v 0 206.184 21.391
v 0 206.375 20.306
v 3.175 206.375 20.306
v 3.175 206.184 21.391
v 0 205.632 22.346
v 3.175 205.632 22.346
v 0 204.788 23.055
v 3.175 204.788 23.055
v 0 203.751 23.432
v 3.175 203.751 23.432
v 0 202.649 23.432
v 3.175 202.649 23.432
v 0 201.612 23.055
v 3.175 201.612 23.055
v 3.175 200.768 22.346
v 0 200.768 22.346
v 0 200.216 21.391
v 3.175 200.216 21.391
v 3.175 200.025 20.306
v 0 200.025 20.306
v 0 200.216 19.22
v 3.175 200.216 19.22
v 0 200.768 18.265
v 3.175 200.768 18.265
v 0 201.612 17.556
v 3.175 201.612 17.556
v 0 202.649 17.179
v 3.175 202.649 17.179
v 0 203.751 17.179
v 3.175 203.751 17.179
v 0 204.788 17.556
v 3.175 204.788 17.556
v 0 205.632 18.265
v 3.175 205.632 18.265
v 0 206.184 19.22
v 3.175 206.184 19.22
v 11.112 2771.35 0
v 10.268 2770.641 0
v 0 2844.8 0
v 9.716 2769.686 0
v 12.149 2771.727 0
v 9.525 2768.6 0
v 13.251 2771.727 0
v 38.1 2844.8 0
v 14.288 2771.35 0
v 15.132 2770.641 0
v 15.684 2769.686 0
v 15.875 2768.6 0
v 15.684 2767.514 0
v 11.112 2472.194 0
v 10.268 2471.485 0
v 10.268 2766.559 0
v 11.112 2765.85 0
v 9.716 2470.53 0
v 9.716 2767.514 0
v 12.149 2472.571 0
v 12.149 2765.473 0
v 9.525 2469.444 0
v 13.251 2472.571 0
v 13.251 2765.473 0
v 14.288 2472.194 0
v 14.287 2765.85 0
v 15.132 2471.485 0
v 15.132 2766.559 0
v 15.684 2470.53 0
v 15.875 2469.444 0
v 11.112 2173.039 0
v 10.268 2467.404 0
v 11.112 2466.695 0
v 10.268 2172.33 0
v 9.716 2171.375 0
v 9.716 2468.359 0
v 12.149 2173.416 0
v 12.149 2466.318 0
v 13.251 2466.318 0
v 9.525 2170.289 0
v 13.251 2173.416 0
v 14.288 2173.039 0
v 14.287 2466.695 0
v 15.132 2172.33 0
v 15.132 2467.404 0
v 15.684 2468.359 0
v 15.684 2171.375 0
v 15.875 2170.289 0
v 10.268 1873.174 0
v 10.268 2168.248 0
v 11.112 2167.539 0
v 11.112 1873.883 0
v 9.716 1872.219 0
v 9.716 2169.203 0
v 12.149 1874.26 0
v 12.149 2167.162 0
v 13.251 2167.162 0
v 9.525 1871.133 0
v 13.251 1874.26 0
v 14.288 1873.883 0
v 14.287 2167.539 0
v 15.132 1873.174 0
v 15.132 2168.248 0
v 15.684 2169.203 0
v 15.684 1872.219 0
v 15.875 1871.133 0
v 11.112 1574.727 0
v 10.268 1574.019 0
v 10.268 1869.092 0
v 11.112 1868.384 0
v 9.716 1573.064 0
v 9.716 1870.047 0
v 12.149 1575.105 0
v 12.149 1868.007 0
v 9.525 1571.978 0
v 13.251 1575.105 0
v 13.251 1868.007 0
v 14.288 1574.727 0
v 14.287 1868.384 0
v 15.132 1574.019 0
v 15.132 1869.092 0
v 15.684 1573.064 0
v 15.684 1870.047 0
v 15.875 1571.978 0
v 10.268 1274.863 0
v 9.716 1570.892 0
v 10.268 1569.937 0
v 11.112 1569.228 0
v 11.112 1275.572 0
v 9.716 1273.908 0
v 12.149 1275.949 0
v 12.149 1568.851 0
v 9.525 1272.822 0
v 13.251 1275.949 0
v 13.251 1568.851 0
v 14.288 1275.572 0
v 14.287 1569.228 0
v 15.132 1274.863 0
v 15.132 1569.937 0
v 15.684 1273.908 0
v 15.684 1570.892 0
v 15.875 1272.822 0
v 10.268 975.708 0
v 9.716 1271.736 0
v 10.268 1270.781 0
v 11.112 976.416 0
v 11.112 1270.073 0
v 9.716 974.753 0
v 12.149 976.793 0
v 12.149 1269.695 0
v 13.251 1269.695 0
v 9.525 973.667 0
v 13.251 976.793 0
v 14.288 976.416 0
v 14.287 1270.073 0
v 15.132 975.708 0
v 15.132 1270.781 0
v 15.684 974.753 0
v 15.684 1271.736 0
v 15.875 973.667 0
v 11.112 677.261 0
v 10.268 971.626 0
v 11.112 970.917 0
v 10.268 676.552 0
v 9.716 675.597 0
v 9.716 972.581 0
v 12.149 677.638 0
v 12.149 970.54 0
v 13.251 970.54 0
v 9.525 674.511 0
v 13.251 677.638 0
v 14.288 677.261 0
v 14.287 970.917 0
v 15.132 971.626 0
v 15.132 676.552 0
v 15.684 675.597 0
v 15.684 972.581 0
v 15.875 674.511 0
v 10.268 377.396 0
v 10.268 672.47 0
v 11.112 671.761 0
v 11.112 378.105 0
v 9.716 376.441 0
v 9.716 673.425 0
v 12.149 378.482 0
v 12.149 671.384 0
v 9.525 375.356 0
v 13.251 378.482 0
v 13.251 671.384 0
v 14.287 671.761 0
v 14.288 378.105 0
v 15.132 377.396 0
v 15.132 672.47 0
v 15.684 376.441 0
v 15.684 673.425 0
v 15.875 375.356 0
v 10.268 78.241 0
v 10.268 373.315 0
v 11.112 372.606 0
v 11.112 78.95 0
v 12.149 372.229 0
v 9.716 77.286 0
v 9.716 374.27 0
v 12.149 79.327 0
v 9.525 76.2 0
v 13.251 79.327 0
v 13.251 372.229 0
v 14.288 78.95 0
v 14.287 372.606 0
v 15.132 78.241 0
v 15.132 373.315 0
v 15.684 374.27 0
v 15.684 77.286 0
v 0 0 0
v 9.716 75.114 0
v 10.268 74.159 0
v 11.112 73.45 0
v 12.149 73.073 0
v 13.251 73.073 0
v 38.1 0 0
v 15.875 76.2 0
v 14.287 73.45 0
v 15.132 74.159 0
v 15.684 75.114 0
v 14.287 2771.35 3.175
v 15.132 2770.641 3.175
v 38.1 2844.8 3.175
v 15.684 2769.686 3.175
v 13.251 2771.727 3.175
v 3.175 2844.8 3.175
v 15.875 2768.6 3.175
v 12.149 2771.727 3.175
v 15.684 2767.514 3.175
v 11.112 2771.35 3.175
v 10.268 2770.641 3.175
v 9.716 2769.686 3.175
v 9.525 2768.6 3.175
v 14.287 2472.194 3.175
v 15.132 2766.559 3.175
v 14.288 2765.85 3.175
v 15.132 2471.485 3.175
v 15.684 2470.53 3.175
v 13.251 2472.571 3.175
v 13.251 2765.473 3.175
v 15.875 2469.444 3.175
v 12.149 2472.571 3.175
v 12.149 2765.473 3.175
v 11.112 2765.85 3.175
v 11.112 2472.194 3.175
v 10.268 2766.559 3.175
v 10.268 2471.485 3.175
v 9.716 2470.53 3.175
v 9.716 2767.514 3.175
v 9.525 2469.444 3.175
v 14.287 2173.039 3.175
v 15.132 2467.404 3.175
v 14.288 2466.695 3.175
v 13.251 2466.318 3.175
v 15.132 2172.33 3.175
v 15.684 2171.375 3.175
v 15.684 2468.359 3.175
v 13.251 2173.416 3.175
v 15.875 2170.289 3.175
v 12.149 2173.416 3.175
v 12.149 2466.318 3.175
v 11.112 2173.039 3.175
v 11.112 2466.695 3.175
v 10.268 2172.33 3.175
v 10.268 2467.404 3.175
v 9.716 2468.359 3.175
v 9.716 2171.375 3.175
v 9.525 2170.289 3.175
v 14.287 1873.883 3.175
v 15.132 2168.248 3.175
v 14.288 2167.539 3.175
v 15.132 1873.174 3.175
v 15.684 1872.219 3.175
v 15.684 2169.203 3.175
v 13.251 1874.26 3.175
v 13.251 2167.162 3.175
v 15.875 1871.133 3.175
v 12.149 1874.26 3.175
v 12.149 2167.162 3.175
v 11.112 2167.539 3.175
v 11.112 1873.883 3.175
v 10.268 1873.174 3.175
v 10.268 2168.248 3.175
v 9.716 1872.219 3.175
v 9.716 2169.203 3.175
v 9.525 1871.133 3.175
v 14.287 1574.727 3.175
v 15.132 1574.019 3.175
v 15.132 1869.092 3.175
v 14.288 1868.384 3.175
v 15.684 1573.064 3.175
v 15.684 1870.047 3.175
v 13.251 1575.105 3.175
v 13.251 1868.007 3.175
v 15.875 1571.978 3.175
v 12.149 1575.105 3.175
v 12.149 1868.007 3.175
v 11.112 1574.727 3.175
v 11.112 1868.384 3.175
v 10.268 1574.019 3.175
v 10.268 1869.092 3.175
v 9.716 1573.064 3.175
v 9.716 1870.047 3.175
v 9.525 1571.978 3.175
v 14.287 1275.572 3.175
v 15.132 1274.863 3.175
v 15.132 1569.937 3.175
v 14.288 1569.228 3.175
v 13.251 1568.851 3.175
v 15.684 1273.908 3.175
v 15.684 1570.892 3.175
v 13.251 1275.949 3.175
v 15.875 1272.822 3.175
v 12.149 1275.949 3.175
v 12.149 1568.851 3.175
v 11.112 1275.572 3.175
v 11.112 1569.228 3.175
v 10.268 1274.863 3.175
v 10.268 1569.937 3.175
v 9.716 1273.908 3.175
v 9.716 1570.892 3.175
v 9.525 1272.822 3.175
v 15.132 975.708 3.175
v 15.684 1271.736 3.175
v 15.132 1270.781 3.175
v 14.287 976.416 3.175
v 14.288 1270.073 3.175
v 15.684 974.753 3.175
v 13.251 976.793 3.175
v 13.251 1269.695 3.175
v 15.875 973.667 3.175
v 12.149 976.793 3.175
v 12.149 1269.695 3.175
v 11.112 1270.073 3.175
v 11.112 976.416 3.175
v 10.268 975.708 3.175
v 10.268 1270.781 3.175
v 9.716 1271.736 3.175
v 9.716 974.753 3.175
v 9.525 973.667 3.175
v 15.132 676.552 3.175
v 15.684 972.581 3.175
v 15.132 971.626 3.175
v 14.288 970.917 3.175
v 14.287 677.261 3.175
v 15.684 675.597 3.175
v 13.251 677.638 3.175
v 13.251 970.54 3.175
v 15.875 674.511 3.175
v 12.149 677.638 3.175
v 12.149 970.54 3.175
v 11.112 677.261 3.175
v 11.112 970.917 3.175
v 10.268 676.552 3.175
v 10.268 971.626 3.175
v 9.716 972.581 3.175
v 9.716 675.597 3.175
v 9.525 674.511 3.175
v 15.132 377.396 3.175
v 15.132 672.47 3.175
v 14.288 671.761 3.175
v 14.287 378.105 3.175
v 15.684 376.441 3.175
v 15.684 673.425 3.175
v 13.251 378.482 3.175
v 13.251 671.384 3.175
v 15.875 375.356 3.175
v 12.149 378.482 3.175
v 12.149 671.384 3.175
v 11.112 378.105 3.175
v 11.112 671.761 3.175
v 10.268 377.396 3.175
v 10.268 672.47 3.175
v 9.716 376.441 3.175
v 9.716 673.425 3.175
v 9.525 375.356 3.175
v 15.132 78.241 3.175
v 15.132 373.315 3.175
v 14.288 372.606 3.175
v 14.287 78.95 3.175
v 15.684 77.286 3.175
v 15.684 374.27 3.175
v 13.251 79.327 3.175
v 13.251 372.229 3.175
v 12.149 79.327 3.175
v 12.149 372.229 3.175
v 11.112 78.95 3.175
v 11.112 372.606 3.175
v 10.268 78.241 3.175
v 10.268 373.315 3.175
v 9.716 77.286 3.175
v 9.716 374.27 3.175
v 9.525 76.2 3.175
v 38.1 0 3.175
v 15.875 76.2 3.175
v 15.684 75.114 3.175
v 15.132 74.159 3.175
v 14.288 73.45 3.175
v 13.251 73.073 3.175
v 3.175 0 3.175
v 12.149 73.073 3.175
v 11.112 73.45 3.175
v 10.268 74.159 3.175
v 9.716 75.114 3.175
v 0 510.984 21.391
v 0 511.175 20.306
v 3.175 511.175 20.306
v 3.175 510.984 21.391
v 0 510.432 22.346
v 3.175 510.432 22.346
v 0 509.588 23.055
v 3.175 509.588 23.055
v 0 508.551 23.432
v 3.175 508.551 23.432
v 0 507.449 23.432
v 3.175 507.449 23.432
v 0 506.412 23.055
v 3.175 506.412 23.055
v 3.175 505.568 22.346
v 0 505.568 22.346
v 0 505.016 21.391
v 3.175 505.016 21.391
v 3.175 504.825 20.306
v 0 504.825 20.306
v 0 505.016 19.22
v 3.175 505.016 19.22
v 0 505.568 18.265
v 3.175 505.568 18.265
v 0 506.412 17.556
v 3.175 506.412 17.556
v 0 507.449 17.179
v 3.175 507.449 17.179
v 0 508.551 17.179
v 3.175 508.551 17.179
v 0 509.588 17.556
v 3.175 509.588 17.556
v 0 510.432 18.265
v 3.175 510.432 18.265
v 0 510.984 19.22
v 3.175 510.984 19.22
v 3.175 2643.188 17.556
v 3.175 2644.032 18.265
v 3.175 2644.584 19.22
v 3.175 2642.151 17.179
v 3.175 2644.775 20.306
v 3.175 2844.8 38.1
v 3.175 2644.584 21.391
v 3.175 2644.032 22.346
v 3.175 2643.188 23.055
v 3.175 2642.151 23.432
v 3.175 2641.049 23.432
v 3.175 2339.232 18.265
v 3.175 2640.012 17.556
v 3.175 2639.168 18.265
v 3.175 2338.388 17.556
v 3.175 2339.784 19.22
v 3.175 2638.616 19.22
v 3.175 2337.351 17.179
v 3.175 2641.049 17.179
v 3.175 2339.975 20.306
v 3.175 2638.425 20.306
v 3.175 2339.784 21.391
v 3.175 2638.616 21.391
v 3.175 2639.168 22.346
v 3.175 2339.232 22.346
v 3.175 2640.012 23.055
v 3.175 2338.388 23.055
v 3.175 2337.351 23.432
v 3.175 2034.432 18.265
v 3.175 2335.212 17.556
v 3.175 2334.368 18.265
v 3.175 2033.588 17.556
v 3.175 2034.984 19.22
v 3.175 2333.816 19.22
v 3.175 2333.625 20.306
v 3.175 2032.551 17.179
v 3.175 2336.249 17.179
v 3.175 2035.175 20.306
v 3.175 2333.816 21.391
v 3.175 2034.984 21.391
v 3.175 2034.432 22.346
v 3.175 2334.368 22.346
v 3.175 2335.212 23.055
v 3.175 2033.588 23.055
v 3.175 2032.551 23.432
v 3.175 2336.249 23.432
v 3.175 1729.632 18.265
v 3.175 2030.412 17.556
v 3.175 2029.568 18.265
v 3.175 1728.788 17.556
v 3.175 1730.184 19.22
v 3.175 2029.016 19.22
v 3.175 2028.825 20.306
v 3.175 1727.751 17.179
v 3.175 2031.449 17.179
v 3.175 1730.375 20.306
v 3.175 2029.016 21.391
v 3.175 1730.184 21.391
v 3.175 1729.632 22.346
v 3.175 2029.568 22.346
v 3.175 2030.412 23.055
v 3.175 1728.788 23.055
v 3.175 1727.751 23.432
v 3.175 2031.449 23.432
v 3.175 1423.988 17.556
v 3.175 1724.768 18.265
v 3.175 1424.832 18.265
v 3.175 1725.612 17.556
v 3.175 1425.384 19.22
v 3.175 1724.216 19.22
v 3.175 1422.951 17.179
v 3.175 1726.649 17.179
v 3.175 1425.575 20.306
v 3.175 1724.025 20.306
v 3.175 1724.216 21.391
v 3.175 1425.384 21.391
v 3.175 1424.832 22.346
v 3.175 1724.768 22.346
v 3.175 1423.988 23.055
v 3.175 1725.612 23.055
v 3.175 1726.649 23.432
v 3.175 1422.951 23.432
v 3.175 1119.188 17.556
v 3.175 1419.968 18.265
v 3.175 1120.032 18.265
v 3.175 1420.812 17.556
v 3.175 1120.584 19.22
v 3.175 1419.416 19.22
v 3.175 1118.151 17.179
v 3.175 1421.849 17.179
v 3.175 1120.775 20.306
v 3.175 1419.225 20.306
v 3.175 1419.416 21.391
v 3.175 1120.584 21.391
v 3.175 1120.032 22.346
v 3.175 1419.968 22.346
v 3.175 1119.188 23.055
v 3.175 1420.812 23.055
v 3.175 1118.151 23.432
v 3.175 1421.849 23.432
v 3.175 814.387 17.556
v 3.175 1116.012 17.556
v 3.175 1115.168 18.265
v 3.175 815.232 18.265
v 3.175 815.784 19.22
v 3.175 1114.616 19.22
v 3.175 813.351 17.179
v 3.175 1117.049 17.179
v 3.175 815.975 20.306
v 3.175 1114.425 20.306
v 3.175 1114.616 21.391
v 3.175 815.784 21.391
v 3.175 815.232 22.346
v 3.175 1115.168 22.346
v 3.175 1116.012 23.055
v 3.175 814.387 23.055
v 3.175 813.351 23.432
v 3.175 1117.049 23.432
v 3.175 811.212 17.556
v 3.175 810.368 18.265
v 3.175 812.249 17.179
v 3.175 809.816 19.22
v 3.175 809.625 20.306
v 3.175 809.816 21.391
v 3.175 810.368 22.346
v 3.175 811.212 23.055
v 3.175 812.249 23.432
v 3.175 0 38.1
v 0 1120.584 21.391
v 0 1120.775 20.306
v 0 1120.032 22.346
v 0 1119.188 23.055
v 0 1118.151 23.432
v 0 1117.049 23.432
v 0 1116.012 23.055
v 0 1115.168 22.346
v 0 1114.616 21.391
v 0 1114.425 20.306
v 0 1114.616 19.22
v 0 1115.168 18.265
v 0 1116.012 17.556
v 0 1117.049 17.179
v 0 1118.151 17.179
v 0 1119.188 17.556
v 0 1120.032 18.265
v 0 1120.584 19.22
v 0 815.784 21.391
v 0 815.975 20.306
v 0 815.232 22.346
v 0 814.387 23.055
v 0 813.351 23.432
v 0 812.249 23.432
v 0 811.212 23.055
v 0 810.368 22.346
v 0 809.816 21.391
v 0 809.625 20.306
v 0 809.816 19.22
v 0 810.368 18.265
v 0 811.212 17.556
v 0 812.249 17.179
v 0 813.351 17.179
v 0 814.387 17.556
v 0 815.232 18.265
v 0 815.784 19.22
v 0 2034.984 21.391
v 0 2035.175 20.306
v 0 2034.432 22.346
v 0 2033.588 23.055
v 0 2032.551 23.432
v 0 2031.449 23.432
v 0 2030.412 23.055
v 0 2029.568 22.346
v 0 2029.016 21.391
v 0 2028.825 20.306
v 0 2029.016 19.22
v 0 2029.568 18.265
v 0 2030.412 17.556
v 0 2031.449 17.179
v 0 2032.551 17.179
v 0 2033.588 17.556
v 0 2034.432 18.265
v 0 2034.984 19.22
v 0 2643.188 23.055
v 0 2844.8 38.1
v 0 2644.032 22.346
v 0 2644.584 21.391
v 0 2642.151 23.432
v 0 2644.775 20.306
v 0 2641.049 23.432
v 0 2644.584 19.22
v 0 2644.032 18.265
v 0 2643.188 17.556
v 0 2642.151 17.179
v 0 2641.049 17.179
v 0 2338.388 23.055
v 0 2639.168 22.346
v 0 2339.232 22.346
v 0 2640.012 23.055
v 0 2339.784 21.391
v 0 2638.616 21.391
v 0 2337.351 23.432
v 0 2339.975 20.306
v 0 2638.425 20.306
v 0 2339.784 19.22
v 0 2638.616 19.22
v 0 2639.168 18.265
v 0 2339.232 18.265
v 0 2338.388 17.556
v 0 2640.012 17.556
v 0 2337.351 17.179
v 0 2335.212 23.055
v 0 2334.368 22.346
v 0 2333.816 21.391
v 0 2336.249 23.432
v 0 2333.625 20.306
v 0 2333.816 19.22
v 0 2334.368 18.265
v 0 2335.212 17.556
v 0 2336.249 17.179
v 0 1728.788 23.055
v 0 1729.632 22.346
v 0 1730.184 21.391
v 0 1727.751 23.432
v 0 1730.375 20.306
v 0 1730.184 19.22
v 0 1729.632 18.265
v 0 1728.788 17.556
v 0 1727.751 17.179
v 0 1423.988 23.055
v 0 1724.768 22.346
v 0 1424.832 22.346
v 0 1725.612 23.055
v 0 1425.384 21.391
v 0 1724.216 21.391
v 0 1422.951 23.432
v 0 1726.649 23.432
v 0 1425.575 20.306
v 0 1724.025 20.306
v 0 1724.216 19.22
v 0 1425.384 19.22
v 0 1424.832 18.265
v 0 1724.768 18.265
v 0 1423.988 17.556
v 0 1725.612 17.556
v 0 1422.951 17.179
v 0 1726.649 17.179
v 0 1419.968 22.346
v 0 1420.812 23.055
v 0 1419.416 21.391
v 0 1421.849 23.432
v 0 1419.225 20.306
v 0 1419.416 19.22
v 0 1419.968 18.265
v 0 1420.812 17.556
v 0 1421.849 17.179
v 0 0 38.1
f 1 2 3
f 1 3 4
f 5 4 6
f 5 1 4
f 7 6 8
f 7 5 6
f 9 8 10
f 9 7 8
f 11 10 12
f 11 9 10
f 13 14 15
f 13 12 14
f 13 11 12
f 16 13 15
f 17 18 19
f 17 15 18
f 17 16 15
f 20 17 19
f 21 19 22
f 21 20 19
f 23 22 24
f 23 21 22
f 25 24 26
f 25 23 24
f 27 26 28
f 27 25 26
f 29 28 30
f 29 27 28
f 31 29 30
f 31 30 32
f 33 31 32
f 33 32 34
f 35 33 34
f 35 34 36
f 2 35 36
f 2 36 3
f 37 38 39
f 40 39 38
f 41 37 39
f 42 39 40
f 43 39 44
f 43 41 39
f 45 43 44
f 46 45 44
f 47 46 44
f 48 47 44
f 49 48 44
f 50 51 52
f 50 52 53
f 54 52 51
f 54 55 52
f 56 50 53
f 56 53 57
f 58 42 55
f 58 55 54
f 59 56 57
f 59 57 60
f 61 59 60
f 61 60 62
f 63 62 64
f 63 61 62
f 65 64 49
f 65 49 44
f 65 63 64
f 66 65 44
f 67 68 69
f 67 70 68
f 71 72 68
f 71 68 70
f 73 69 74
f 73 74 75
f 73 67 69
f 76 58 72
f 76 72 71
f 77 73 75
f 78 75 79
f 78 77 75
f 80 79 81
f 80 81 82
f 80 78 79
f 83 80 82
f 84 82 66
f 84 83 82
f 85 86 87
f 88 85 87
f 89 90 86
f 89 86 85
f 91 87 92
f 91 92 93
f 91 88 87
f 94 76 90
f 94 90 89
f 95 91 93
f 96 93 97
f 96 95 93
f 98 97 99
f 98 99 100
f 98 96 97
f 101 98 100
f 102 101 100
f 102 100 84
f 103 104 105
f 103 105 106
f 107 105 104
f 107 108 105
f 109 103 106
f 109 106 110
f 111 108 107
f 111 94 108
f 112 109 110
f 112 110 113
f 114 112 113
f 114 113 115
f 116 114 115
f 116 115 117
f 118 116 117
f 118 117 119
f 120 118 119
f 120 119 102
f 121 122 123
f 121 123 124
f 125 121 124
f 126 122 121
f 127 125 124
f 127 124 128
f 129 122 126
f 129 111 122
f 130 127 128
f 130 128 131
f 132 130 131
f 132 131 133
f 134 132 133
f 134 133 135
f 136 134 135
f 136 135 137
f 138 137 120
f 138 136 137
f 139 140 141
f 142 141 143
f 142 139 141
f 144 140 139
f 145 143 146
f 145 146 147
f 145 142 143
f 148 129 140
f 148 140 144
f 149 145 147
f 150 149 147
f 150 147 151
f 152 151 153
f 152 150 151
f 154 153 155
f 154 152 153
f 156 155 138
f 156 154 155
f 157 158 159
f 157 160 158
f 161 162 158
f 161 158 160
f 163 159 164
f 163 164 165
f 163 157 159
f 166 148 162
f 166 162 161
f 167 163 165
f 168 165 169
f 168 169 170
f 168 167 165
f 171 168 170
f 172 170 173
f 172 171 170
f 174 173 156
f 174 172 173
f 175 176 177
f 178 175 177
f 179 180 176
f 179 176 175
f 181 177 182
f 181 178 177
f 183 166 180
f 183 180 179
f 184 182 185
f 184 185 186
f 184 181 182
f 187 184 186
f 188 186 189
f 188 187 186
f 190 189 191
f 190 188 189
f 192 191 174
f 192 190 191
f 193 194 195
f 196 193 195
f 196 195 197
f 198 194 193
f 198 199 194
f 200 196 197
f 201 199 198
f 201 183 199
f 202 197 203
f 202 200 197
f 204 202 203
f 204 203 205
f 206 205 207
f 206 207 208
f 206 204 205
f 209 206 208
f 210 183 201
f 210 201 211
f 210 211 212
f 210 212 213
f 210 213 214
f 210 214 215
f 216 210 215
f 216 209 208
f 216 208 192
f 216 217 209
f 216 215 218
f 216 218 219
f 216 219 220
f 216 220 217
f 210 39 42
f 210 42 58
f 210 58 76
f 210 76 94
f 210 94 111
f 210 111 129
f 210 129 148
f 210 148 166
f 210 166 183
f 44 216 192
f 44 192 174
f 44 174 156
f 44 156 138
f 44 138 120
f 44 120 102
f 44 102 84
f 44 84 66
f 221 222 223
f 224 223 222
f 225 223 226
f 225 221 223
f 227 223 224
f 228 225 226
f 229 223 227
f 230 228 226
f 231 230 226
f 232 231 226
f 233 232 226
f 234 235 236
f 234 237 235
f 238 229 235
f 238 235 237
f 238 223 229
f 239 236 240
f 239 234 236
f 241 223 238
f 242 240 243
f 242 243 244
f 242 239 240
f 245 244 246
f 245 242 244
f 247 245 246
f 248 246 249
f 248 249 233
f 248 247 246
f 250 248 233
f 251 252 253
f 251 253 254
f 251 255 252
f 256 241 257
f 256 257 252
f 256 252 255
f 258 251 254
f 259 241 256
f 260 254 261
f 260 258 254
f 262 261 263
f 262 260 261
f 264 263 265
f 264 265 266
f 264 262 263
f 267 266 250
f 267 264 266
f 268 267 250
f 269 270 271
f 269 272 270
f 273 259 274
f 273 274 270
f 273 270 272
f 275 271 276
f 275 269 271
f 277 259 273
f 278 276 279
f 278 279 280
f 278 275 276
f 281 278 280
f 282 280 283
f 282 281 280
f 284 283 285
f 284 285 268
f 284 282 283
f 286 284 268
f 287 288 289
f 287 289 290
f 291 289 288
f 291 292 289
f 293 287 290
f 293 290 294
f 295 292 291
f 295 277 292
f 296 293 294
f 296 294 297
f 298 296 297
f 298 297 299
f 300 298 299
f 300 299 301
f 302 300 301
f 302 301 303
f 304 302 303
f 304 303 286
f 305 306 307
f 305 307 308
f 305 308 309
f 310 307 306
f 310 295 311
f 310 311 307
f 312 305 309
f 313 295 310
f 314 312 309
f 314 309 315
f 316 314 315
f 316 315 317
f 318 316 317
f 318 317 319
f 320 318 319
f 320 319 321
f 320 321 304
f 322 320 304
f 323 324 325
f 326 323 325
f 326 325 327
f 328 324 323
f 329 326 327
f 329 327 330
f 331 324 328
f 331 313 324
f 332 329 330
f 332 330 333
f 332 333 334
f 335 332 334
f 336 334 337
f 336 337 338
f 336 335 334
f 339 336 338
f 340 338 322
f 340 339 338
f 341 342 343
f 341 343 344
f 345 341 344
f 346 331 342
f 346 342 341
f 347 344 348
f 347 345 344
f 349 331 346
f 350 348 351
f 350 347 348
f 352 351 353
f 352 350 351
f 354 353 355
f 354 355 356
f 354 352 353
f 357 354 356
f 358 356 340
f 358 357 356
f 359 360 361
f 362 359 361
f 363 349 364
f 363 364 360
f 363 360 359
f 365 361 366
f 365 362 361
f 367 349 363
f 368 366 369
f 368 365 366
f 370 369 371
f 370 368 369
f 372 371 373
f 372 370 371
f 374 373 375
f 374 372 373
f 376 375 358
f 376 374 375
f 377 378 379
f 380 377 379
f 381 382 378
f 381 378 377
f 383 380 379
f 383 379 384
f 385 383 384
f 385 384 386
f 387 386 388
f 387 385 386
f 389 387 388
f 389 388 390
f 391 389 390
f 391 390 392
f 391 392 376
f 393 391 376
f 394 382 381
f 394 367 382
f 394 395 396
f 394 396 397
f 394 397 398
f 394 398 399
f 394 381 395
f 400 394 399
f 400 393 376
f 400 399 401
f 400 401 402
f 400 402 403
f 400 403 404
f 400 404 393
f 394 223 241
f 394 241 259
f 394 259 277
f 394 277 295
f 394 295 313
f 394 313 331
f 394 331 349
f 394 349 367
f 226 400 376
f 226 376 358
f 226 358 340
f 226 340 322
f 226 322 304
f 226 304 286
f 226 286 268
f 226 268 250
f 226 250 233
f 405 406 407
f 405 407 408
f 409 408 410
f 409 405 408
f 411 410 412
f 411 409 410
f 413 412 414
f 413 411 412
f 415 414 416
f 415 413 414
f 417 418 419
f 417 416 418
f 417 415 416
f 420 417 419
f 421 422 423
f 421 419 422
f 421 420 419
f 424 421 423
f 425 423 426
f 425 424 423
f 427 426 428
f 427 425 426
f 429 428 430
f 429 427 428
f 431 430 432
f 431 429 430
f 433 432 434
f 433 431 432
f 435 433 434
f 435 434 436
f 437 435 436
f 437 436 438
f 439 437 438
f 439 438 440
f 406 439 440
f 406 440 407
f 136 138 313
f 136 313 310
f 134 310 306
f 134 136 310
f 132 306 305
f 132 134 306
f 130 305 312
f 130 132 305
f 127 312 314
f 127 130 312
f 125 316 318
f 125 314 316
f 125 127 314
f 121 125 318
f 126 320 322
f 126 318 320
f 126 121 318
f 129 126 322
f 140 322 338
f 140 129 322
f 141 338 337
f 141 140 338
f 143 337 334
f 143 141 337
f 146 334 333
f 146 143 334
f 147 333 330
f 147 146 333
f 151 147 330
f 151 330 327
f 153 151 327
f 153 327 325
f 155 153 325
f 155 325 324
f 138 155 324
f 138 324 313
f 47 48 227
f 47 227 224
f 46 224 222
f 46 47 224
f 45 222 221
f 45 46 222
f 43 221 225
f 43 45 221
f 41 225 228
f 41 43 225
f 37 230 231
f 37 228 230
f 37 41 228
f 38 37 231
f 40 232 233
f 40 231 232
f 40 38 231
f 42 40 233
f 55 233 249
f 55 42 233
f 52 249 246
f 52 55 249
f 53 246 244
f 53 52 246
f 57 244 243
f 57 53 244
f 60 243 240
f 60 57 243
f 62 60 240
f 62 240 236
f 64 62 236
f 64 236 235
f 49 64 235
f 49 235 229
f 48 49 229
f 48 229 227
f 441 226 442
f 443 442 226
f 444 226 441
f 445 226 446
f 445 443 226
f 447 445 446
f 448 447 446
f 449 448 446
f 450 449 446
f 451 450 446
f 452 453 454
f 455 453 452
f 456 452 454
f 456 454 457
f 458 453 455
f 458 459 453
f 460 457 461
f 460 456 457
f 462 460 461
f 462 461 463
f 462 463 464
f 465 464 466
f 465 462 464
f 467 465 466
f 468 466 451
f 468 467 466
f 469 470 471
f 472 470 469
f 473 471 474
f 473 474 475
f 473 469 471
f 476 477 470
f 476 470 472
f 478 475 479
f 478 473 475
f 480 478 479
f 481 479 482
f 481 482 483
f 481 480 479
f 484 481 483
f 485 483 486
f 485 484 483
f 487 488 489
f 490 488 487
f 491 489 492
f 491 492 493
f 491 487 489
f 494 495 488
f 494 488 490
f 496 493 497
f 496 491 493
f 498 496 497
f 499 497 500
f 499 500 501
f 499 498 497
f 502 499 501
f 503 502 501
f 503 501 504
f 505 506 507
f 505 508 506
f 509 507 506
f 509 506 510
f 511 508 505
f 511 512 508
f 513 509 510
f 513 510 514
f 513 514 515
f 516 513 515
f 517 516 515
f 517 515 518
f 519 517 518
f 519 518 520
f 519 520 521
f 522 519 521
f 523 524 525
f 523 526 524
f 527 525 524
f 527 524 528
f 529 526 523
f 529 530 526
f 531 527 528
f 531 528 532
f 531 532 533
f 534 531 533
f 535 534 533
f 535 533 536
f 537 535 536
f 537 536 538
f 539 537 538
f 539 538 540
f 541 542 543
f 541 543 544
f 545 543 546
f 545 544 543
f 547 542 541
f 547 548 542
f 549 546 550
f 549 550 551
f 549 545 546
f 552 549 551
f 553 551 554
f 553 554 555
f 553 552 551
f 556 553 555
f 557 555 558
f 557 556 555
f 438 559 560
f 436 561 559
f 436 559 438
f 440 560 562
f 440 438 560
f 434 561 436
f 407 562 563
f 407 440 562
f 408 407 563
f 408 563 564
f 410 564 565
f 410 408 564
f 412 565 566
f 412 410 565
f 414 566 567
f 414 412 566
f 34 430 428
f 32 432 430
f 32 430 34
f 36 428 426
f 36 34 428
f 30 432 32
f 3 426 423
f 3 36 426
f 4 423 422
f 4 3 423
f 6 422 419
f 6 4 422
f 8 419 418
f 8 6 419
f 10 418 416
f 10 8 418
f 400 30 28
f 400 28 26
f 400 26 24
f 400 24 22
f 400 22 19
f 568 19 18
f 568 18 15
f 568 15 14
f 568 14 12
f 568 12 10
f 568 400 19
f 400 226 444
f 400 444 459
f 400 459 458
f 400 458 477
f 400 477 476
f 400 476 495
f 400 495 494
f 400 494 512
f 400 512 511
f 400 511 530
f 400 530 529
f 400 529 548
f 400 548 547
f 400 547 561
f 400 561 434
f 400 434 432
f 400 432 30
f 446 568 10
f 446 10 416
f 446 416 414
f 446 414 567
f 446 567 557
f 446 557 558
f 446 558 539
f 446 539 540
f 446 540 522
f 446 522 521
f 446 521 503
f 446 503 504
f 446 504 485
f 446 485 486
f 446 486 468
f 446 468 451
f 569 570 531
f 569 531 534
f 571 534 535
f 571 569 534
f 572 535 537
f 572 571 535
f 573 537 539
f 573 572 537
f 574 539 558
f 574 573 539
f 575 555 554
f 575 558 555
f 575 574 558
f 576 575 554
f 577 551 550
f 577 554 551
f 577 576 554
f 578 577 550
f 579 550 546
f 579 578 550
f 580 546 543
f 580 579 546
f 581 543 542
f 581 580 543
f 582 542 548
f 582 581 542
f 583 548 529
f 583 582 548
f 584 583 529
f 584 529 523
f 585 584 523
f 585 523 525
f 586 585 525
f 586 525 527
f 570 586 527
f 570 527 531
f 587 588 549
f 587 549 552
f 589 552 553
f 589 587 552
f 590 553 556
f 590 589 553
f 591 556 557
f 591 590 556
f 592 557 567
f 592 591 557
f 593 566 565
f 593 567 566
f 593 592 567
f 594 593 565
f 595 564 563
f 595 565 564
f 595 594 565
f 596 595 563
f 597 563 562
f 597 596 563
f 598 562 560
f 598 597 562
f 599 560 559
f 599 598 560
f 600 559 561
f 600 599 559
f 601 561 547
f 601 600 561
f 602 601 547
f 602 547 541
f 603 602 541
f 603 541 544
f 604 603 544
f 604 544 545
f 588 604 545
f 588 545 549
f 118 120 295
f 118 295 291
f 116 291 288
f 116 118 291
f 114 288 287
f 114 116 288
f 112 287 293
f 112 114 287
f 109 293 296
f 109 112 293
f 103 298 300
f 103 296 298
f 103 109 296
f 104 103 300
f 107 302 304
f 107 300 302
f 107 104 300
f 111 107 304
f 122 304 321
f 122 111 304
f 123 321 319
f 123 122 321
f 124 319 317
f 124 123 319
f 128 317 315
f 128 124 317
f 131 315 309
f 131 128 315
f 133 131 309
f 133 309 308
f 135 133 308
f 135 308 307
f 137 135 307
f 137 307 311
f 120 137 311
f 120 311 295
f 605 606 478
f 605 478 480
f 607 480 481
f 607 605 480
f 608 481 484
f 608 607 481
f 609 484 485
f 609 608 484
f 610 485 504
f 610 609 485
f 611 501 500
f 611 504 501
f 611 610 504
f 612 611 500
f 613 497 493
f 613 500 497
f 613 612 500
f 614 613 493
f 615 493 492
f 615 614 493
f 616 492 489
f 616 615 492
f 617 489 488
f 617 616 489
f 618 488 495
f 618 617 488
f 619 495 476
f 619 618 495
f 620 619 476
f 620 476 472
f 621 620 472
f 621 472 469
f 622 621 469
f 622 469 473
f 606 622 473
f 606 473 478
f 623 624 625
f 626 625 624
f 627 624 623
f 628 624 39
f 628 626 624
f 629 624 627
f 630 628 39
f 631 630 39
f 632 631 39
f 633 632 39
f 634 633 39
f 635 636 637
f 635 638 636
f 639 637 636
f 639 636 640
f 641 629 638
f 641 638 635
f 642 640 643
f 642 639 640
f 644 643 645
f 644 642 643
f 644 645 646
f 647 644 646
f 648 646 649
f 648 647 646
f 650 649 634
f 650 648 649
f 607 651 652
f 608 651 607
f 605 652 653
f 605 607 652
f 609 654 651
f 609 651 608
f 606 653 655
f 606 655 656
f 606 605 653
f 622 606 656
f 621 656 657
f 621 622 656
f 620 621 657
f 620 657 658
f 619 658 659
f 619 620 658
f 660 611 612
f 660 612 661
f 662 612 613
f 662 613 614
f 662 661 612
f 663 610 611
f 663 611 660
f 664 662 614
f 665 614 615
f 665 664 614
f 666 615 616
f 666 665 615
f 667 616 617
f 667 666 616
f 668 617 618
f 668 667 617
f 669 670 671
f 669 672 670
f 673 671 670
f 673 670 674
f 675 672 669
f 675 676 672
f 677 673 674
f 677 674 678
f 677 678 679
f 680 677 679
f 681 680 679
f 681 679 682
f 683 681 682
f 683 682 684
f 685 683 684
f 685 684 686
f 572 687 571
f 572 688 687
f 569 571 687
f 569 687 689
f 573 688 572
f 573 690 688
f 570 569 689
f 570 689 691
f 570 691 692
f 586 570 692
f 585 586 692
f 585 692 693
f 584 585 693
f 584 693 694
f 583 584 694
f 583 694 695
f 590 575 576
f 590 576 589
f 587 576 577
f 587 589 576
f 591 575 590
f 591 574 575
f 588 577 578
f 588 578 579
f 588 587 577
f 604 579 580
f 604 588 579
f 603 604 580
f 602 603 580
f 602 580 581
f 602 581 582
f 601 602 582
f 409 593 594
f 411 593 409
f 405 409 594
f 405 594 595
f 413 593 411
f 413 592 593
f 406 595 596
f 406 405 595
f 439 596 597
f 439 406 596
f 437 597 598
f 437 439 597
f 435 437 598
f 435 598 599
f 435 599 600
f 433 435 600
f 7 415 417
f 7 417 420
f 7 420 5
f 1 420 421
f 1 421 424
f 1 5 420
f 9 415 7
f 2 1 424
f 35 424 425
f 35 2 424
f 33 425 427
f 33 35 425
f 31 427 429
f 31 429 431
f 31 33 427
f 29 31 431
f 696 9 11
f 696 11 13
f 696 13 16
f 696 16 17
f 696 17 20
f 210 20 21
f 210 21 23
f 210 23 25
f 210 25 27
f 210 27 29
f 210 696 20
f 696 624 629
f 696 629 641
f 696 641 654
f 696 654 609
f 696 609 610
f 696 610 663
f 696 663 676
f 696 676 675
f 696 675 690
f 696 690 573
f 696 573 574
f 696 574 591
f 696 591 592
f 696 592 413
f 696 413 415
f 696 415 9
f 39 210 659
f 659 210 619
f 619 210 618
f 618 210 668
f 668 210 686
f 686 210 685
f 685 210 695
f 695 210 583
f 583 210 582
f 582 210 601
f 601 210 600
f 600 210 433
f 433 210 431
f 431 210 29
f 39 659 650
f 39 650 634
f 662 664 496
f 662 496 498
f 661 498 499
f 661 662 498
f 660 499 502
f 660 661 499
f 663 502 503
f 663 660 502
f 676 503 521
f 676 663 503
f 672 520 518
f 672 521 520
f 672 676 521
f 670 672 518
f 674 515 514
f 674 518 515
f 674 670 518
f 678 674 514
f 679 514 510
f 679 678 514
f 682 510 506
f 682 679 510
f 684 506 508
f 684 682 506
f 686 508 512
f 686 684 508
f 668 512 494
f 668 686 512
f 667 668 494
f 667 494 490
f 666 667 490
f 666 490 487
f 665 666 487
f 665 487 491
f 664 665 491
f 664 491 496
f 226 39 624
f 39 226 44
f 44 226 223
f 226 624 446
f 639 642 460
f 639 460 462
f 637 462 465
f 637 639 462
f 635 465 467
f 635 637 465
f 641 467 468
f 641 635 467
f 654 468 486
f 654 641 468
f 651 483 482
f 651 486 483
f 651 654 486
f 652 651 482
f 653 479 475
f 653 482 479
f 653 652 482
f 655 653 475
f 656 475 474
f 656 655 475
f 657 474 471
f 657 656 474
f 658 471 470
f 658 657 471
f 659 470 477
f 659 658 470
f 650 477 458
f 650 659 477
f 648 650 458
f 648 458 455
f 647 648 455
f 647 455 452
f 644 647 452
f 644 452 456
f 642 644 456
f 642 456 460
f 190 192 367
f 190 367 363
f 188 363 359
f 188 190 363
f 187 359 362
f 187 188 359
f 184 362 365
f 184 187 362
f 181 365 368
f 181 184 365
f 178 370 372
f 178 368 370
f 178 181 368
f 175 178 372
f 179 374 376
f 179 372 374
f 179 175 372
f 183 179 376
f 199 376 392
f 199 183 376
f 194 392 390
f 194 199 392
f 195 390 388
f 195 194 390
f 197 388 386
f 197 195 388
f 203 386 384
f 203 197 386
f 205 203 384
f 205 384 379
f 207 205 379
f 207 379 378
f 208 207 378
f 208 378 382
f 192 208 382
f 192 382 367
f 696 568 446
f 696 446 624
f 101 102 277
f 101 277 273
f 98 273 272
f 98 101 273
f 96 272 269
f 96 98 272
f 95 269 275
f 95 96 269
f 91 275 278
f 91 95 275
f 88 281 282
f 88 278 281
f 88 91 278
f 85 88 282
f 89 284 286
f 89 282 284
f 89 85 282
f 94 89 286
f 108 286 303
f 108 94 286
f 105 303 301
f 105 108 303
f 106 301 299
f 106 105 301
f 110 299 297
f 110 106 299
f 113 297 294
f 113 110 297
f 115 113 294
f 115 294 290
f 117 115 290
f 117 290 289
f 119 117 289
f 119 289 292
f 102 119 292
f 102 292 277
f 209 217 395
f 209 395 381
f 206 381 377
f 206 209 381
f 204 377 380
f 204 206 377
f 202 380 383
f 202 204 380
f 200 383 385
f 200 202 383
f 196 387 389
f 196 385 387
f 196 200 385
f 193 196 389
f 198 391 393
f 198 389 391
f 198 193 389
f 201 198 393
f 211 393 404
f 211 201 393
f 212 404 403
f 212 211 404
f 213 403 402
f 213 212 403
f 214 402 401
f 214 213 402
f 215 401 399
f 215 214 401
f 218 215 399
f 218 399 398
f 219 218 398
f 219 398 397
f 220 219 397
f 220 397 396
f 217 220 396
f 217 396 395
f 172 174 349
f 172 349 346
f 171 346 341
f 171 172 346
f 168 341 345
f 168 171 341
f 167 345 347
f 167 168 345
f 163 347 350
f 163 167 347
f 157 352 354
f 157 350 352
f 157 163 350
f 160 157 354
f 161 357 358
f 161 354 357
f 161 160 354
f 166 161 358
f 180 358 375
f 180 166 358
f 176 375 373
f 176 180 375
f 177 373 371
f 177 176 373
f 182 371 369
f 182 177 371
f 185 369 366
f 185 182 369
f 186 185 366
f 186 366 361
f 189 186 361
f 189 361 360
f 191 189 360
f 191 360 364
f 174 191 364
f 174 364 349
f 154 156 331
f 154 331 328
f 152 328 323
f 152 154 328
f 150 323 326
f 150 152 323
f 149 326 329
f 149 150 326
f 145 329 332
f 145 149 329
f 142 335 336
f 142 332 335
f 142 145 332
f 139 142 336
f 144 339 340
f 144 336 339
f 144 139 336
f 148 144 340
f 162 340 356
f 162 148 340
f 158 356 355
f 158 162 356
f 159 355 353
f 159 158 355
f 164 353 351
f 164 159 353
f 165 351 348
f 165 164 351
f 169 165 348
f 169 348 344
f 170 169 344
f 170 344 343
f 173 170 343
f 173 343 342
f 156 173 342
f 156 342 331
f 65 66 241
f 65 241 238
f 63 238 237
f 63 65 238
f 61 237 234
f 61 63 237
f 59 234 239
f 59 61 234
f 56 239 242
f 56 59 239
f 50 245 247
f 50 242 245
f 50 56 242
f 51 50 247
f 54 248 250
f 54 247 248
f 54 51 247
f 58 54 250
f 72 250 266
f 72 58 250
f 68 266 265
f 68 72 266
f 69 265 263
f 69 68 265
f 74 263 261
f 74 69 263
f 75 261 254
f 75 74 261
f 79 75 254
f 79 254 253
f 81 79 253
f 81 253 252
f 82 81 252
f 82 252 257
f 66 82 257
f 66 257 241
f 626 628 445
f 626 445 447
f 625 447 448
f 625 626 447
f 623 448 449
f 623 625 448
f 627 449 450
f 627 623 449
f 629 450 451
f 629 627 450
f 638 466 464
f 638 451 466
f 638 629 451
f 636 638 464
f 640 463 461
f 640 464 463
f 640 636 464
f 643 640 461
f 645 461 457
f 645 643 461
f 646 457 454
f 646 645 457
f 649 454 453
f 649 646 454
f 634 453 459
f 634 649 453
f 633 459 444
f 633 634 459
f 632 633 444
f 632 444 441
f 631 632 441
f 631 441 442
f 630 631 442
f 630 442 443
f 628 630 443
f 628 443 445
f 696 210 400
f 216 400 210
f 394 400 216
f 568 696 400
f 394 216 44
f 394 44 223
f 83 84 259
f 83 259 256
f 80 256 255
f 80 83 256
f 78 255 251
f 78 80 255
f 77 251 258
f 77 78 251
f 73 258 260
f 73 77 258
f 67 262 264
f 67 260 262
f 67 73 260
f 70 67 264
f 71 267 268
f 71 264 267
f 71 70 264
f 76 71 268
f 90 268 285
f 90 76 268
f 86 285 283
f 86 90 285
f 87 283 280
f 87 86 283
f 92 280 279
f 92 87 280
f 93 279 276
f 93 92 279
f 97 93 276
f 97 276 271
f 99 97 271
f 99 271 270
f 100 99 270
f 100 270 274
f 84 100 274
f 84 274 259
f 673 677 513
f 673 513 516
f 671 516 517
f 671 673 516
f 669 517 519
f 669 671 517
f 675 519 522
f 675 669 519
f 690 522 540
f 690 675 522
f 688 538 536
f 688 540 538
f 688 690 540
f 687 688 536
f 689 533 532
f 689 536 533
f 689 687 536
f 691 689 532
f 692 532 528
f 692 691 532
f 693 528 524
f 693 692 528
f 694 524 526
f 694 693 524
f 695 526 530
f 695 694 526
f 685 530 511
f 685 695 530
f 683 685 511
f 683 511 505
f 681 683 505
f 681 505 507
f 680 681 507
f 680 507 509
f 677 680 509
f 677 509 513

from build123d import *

# Parameters (mm, degrees)
F1_DEPTH = 2844.8
F2_R     = 3.175
F4_DEPTH = 25.4
F3_R     = 3.175
F5_DEPTH = 25.4


with BuildPart() as f1:
    # F0 (on Front) → F1 (new body)
    with BuildSketch(Plane.XZ):
        Polygon((0, 38.1), (0, 0), (38.1, 0), (38.1, 3.175), (3.175, 3.175), (3.175, 38.1), align=None)
    extrude(amount=-F1_DEPTH)

    # F2 (on Top) → F4 (cut)
    with BuildSketch(Plane.XY):
        with Locations((12.7, 76.2)):
            Circle(F2_R)
        with Locations((12.7, 375.355556)):
            Circle(F2_R)
        with Locations((12.7, 674.511111)):
            Circle(F2_R)
        with Locations((12.7, 973.666667)):
            Circle(F2_R)
        with Locations((12.7, 1272.822222)):
            Circle(F2_R)
        with Locations((12.7, 1571.977778)):
            Circle(F2_R)
        with Locations((12.7, 1871.133333)):
            Circle(F2_R)
        with Locations((12.7, 2170.288889)):
            Circle(F2_R)
        with Locations((12.7, 2469.444444)):
            Circle(F2_R)
        with Locations((12.7, 2768.6)):
            Circle(F2_R)
    extrude(amount=F4_DEPTH, mode=Mode.SUBTRACT)

    # F3 (on Right) → F5 (cut)
    with BuildSketch(Plane.YZ):
        with Locations((203.2, 20.305524)):
            Circle(F3_R)
        with Locations((508, 20.305524)):
            Circle(F3_R)
        with Locations((812.8, 20.305524)):
            Circle(F3_R)
        with Locations((1117.6, 20.305524)):
            Circle(F3_R)
        with Locations((1422.4, 20.305524)):
            Circle(F3_R)
        with Locations((1727.2, 20.305524)):
            Circle(F3_R)
        with Locations((2032, 20.305524)):
            Circle(F3_R)
        with Locations((2336.8, 20.305524)):
            Circle(F3_R)
        with Locations((2641.6, 20.305524)):
            Circle(F3_R)
    extrude(amount=F5_DEPTH, mode=Mode.SUBTRACT)


solid = f1.part
